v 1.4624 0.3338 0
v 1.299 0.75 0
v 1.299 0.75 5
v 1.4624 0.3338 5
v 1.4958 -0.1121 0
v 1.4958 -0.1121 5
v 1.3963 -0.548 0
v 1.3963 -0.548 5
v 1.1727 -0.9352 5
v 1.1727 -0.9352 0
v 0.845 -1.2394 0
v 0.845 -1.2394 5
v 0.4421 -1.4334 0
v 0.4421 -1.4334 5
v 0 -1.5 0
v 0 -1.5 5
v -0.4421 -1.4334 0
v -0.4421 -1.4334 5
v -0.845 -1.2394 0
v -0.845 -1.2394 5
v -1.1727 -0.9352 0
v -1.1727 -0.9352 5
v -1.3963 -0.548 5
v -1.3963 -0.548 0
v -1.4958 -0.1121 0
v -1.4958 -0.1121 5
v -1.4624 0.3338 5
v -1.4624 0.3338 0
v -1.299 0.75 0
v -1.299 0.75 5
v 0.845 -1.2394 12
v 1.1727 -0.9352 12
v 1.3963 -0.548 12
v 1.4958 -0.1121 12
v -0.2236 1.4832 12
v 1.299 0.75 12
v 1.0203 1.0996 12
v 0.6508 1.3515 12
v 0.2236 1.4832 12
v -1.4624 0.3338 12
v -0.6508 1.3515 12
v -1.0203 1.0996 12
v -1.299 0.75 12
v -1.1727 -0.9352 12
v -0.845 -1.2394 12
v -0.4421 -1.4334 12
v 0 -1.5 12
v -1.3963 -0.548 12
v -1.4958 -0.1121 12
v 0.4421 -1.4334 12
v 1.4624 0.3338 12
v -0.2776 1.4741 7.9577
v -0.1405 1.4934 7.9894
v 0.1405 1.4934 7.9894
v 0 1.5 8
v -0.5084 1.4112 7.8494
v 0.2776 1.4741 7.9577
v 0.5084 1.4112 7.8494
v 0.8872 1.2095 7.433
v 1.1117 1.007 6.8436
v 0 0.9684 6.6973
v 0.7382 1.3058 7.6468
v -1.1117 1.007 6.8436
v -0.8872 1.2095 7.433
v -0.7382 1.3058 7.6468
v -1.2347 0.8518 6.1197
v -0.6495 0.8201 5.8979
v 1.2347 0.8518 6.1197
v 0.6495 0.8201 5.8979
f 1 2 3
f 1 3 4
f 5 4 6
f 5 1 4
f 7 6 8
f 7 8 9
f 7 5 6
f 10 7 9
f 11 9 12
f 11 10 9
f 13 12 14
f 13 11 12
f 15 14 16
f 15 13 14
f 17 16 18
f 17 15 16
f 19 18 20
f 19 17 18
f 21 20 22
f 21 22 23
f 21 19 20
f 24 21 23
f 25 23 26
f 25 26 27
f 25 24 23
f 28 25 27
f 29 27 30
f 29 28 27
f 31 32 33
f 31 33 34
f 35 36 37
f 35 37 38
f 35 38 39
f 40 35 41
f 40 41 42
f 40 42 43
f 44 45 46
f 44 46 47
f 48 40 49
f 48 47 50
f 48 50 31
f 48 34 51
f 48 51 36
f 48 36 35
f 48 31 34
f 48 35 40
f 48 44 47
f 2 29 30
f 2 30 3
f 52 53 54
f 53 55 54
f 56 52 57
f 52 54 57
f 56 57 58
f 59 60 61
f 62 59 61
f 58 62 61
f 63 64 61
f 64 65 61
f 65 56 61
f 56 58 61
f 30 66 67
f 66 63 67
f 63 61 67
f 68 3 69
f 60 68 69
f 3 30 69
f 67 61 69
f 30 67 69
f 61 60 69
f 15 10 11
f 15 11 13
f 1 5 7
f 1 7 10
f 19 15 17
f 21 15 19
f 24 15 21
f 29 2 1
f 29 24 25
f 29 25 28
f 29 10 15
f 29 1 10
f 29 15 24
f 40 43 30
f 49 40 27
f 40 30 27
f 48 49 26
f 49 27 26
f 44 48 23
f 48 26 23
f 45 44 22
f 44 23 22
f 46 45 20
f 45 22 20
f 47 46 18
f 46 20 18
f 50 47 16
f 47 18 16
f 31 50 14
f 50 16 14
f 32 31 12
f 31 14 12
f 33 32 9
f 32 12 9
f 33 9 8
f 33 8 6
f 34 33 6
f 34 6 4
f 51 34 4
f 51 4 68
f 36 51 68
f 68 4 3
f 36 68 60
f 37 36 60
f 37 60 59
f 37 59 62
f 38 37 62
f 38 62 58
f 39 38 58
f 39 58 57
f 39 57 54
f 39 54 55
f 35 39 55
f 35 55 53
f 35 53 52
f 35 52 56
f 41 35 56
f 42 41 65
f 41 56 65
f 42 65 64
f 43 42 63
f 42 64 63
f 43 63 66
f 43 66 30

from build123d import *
from build123d.topology import SkipClean

# Parameters (mm, degrees)
BOSS_EXTRU_1_DEPTH      = 5
ESQUISSE2_R             = 1.5
BOSS_EXTRU_2_DEPTH      = 7
ENL_V_MAT_EXTRU_1_DEPTH = 3


with BuildPart() as part:
    # Esquisse1 → Boss.-Extru.1 (new body)
    with BuildSketch(Plane.XY):
        with BuildLine():
            Line((-1.299038106, 0.75), (1.299038106, 0.75))
            ThreePointArc((1.299038106, 0.75), (0, -1.5), (-1.299038106, 0.75))
        make_face()
    extrude(amount=BOSS_EXTRU_1_DEPTH)

    # Esquisse2 → Boss.-Extru.2 (add)
    with SkipClean():  # the faces are left unmerged after this step: merging them gives an invalid solid
        with BuildSketch(Plane.XY.offset(5)):
            with Locations(Location((0, 0, 0), (0, 0, 150))):
                Circle(ESQUISSE2_R)
        extrude(amount=BOSS_EXTRU_2_DEPTH)

    # Esquisse3 → Enlèv. mat.-Extru.1 (cut)
    with SkipClean():  # the faces are left unmerged after this step: merging them gives an invalid solid
        with BuildSketch(Plane(origin=(1.5, 0, 0), x_dir=(0, 0, -1), z_dir=(1, 0, 0))):
            with BuildLine():
                Line((-8, 1.5), (-5, 1.5))
                Line((-5, 1.5), (-5, 0.75))
                add(Edge.make_bspline(
                    [(-8, 1.5), (-6.894526205, 0.811843176), (-5, 0.75)],
                    knots=[0, 0, 0, 0.697141836, 0.697141836, 0.697141836], degree=2))
            make_face()
        extrude(amount=-ENL_V_MAT_EXTRU_1_DEPTH, mode=Mode.SUBTRACT)


solid = part.part
